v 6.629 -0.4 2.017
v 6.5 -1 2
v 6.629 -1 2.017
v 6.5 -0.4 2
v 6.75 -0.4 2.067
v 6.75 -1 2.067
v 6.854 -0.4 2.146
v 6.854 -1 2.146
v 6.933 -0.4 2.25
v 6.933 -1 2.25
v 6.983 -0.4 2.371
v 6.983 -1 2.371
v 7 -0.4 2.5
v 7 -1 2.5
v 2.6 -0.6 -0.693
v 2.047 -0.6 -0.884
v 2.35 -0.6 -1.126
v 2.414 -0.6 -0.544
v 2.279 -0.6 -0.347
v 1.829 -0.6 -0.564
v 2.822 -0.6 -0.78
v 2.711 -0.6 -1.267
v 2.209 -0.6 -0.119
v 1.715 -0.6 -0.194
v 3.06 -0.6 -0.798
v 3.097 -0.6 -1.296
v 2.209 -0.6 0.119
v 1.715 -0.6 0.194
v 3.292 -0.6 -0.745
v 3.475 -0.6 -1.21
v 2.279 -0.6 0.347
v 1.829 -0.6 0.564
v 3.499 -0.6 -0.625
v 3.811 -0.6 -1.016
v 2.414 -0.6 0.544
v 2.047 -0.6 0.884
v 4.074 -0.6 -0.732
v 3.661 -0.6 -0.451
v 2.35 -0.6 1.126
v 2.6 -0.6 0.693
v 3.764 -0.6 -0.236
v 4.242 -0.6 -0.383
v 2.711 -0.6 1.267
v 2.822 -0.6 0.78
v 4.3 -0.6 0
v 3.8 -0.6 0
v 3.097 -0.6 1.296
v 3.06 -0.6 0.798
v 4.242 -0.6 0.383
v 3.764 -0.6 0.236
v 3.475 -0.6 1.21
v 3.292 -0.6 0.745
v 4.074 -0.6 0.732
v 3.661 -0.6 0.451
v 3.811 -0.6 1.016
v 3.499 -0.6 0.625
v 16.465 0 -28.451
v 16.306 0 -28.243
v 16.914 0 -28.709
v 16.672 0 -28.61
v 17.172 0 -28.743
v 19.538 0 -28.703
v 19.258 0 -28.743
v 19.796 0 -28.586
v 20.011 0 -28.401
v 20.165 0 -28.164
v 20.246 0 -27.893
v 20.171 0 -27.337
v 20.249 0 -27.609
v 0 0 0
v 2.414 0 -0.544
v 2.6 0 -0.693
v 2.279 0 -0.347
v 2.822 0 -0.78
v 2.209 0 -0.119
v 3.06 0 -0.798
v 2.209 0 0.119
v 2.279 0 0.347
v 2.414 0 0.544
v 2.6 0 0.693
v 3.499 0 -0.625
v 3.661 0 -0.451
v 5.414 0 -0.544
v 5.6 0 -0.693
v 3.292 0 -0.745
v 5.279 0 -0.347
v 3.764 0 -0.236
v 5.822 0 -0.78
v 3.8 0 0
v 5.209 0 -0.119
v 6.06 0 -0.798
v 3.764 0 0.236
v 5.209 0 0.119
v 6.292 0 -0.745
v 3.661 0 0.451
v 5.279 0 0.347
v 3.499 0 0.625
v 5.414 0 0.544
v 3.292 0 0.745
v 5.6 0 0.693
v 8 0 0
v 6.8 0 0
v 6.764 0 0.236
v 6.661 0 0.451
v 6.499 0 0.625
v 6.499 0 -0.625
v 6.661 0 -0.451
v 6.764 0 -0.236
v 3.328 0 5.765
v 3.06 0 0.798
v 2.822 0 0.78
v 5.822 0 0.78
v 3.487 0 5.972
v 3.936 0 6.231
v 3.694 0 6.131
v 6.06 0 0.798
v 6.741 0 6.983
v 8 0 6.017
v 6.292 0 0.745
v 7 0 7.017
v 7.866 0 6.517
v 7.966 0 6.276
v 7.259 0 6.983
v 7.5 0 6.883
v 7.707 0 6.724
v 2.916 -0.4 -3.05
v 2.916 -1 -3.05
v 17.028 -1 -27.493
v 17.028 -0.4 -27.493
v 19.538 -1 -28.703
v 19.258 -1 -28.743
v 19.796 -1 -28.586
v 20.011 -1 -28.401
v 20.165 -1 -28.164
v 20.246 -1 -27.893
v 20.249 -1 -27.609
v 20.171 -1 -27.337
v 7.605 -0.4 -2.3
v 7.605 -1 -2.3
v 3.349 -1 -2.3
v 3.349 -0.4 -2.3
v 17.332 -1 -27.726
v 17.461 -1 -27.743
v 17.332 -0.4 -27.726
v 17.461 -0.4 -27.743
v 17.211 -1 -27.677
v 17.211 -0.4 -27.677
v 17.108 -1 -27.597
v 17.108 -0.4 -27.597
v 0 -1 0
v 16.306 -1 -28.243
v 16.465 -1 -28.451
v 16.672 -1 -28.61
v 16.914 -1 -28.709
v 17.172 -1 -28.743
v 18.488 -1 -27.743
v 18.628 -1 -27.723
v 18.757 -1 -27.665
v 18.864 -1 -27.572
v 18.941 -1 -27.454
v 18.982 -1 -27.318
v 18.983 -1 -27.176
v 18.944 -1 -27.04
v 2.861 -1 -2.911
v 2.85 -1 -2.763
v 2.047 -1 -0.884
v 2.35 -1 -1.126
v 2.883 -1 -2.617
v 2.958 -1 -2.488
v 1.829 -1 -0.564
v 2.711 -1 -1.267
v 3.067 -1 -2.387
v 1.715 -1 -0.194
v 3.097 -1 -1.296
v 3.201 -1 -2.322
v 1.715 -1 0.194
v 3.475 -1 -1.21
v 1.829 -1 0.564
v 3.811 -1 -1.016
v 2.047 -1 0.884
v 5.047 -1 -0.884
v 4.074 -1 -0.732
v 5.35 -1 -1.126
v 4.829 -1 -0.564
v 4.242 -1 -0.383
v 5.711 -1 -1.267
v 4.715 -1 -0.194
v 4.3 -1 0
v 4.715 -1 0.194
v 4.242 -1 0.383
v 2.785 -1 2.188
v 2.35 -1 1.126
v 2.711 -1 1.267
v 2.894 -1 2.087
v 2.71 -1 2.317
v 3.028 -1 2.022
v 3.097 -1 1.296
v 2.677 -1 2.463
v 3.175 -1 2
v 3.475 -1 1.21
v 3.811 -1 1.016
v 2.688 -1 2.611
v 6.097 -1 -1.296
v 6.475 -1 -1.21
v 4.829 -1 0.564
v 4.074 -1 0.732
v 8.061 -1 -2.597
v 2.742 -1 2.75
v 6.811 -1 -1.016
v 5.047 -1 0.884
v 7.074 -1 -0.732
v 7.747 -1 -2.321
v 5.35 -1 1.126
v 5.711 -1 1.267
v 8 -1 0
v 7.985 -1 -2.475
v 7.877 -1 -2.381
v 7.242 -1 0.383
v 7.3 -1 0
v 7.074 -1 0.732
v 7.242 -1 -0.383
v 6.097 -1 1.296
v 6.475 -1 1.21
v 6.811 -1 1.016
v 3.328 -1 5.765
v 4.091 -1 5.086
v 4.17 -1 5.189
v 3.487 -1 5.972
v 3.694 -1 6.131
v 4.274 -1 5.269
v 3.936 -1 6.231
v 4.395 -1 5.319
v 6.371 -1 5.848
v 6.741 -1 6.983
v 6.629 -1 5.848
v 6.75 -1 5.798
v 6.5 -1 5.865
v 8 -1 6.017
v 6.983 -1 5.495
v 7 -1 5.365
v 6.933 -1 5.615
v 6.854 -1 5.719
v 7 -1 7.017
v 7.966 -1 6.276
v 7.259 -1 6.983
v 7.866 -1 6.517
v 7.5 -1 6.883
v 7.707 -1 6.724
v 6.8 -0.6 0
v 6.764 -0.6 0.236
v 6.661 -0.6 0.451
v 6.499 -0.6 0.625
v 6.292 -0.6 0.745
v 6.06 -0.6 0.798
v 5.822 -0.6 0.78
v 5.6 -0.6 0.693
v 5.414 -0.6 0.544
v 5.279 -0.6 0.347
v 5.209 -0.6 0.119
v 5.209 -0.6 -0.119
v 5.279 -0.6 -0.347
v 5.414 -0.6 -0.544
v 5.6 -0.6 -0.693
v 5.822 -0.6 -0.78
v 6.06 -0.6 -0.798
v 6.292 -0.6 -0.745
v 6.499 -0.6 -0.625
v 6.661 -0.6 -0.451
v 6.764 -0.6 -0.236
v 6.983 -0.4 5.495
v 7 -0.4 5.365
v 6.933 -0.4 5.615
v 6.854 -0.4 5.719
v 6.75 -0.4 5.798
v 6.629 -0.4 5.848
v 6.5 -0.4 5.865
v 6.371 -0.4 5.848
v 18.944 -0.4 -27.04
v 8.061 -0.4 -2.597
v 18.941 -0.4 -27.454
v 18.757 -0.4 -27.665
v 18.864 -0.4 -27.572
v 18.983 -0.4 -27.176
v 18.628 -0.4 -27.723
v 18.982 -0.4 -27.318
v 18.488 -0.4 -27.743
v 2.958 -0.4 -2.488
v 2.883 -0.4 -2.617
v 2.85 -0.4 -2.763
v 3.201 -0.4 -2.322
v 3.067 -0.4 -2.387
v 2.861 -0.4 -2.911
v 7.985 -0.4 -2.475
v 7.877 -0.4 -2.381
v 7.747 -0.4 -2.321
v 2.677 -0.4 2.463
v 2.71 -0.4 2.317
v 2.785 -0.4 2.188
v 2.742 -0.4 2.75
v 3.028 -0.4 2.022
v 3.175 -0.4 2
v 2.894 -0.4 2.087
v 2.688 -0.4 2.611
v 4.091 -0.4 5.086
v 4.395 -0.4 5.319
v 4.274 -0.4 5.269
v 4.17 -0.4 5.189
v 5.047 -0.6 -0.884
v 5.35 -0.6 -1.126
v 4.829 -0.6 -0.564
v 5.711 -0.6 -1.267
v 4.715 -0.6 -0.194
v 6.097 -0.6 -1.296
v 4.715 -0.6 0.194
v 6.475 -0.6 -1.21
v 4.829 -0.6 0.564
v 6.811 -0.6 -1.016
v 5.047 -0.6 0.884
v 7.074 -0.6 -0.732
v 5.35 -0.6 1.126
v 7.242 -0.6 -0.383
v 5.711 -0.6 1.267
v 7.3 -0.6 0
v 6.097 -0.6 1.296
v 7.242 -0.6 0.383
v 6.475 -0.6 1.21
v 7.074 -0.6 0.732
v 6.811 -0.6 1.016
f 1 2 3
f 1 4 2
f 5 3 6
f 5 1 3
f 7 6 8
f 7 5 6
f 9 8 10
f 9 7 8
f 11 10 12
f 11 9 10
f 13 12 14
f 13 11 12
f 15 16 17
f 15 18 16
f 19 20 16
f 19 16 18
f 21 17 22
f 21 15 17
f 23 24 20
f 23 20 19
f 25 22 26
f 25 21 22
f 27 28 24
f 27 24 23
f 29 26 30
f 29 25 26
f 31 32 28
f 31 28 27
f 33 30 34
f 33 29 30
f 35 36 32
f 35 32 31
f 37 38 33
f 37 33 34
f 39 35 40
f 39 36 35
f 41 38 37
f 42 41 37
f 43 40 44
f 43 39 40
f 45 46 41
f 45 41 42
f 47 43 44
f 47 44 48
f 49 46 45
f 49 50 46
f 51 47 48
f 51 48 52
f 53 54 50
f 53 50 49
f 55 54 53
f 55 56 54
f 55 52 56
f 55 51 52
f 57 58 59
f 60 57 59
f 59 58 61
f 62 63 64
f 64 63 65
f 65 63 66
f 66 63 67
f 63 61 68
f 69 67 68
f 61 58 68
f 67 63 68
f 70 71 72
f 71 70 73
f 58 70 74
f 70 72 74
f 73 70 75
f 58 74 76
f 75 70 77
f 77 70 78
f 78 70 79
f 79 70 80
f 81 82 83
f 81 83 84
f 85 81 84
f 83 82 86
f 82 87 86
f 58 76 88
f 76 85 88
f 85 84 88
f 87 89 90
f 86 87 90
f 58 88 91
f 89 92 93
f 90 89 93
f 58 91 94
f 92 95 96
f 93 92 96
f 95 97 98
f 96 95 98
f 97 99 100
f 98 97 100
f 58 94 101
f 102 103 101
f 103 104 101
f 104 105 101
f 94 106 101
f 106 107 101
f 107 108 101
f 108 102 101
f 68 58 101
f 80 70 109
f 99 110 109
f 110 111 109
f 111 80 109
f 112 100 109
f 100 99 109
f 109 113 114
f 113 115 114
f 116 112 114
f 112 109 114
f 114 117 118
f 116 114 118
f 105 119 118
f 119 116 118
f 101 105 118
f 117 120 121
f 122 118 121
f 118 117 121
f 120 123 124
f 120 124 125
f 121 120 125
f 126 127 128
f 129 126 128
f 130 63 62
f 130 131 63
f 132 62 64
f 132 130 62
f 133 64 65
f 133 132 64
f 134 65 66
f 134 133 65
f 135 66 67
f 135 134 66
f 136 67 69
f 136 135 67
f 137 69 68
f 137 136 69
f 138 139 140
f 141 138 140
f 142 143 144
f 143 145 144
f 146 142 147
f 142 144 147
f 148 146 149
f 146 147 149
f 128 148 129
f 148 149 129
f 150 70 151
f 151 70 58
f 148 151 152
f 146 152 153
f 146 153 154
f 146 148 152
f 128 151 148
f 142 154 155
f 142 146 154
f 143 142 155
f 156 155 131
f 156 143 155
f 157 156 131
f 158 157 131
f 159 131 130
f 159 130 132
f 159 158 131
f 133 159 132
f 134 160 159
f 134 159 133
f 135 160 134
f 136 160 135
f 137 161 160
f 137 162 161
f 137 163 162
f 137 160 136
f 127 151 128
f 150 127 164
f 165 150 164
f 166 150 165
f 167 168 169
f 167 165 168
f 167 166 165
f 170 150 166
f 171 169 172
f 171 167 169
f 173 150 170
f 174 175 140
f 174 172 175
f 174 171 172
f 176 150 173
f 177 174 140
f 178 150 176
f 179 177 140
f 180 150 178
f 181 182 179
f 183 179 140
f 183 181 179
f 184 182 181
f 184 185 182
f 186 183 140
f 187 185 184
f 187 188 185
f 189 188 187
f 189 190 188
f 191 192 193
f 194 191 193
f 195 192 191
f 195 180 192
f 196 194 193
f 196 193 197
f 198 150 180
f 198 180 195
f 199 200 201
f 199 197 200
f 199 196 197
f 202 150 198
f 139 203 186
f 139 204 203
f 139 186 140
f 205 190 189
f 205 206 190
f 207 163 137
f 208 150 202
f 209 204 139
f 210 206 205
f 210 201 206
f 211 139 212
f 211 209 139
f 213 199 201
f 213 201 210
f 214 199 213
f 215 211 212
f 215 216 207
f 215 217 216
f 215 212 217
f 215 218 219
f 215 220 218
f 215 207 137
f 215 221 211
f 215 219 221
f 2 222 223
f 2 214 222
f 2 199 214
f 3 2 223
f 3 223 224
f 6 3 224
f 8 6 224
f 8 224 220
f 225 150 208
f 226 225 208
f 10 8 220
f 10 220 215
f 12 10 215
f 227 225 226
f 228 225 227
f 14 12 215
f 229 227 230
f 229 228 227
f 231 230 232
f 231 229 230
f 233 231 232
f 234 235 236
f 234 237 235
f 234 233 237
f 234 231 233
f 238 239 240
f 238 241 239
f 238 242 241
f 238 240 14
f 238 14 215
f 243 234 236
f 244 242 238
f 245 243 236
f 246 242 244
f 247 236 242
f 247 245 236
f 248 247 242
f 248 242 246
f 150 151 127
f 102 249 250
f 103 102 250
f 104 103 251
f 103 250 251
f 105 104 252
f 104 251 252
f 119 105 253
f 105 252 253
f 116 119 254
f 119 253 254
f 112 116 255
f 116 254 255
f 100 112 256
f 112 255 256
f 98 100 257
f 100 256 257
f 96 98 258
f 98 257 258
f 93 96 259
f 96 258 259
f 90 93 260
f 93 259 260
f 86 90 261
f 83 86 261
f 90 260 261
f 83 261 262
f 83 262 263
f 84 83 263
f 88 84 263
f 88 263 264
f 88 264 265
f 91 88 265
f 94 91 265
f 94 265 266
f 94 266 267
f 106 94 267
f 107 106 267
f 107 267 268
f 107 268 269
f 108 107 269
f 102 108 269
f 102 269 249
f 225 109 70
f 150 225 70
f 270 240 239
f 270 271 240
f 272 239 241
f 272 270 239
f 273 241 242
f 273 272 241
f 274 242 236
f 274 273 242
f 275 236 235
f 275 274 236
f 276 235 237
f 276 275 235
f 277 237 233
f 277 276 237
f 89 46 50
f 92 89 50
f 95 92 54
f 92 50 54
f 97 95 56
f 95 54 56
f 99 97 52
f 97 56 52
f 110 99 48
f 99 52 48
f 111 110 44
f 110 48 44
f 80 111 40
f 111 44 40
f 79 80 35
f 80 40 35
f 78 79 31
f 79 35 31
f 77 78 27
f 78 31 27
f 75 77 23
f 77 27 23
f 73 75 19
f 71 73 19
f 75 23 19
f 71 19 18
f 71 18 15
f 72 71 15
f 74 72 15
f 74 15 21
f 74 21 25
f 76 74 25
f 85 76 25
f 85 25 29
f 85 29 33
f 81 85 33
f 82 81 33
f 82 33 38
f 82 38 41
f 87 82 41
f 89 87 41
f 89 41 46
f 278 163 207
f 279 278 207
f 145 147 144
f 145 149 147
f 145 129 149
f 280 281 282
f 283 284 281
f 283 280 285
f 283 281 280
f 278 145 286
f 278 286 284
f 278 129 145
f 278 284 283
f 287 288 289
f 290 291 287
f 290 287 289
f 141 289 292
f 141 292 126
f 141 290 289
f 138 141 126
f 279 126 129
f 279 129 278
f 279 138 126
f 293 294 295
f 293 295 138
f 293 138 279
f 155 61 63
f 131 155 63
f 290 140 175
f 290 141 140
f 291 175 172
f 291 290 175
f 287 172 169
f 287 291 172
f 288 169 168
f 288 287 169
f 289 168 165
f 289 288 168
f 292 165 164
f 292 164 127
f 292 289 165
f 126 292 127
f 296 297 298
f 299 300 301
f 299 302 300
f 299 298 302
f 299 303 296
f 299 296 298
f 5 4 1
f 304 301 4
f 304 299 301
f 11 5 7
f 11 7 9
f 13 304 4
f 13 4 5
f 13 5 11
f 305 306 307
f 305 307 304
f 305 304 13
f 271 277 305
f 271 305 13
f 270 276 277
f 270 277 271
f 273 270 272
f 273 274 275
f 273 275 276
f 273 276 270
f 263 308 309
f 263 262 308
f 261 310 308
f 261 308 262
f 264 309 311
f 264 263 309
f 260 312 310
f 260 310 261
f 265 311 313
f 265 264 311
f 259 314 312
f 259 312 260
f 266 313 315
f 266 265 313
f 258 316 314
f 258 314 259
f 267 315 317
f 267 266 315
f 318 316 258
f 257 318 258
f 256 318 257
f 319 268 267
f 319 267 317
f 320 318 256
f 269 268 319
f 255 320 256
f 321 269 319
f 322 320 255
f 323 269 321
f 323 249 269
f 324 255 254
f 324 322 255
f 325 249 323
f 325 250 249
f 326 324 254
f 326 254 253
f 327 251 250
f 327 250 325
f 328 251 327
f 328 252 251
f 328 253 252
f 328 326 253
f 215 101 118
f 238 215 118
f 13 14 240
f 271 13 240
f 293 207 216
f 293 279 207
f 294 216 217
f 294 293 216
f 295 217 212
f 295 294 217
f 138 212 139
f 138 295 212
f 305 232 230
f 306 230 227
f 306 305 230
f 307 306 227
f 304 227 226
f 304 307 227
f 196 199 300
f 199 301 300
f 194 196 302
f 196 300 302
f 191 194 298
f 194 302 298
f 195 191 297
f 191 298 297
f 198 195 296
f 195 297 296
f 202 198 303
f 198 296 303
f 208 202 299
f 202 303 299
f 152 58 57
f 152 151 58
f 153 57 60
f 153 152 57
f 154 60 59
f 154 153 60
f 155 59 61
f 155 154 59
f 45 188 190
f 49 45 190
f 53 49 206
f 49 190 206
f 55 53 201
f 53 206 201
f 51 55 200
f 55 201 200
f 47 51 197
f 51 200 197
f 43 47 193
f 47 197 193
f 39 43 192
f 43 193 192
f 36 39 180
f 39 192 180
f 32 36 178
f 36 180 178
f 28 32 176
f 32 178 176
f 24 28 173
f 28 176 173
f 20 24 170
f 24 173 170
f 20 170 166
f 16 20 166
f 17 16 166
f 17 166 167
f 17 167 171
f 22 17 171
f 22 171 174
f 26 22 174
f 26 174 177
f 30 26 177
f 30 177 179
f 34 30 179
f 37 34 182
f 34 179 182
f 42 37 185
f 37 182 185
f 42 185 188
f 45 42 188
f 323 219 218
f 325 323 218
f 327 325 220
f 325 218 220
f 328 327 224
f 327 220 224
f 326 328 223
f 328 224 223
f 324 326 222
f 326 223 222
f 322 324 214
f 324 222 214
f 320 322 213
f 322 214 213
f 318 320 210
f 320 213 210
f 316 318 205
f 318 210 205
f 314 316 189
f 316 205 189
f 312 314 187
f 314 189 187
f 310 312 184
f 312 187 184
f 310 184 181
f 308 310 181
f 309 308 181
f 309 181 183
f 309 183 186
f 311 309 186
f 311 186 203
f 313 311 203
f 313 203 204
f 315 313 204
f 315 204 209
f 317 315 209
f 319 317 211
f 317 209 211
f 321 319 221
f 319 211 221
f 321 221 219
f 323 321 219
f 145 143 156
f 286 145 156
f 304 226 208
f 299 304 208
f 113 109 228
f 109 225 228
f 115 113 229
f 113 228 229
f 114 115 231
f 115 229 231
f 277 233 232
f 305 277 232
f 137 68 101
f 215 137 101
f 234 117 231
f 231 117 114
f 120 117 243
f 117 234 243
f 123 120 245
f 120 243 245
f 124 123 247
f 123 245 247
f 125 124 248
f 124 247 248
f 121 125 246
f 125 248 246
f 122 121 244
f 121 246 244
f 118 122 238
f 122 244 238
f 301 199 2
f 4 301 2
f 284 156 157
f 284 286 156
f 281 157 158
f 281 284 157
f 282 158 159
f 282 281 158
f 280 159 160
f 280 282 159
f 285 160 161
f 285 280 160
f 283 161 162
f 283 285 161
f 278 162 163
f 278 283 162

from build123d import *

# Parameters (mm, degrees)
F1_DEPTH      = 1
F2_R          = 0.8
F3_DEPTH      = 25
F3_DEPTH_BACK = 25
F5_START      = -1.001
F5_DEPTH      = 23.999
F6_R          = 1
F8_DEPTH      = 0.6
F9_R          = 0.5
F10_R         = 1.3
F11_DEPTH     = 0.4


with BuildPart() as f1:
    # F0 (on Front) → F1 (new body)
    with BuildSketch(Plane.XZ):
        Polygon((3.5355339059, 6.123724357), (0, 0), (16.5950652481, -28.7434961647), (20.7974290086, -28.7434961647), (8, 0), (8, 7.3199744415), align=None)
    extrude(amount=F1_DEPTH)

    # F2 (on face) → F3 (cut, two sides)
    with BuildSketch(Plane.XZ.offset(1)) as f3_sk:
        with Locations((3, 0)):
            Circle(F2_R)
        with Locations((6, 0)):
            Circle(F2_R)
    extrude(amount=-F3_DEPTH, mode=Mode.SUBTRACT)
    extrude(f3_sk.sketch, amount=F3_DEPTH_BACK, mode=Mode.SUBTRACT)

    # F4 (on face) → F5 (cut)
    with BuildSketch(Plane.XZ.offset(1).offset(F5_START)):
        Polygon((8, -3.5337661579), (3.9760127691, -3.5337661579), (16.3063901135, -26.2434961647), (18.5897210168, -26.2434961647), align=None)
    extrude(amount=-F5_DEPTH, mode=Mode.SUBTRACT)

    # F6
    f6_edges = [f1.edges().sort_by_distance(p)[0] for p in [
        (16.595065, -0.5, -28.743496),
        (20.797429, -0.5, -28.743496),
        (3.535534, -0.5, 6.123724),
        (8, -0.5, 7.319974),
    ]]
    fillet(f6_edges, radius=F6_R)

    # F7 (on face) → F8 (cut)
    with BuildSketch(Plane.XZ.offset(1)):
        Polygon((2.3094010768, 2), (7, 2), (7, 6.0167490687), (4.1944525285, 5.2650048894), align=None)
        Polygon((17.1724155173, -27.7434961647), (19.2575640448, -27.7434961647), (7.9293896977, -2.3), (2.4826061575, -2.3), align=None)
    extrude(amount=-F8_DEPTH, mode=Mode.SUBTRACT)

    # F9
    f9_edges = [f1.edges().sort_by_distance(p)[0] for p in [
        (2.309401, -0.7, 2),
        (7, -0.7, 2),
        (7, -0.7, 6.016749),
        (4.194453, -0.7, 5.265005),
        (7.92939, -0.7, -2.3),
        (2.482606, -0.7, -2.3),
        (19.257564, -0.7, -27.743496),
        (17.172416, -0.7, -27.743496),
    ]]
    fillet(f9_edges, radius=F9_R)

    # F10 (on face) → F11 (cut)
    with BuildSketch(Plane.XZ.offset(1)):
        with Locations((3, 0)):
            Circle(F10_R)
        with Locations((6, 0)):
            Circle(F10_R)
    extrude(amount=-F11_DEPTH, mode=Mode.SUBTRACT)


solid = f1.part
